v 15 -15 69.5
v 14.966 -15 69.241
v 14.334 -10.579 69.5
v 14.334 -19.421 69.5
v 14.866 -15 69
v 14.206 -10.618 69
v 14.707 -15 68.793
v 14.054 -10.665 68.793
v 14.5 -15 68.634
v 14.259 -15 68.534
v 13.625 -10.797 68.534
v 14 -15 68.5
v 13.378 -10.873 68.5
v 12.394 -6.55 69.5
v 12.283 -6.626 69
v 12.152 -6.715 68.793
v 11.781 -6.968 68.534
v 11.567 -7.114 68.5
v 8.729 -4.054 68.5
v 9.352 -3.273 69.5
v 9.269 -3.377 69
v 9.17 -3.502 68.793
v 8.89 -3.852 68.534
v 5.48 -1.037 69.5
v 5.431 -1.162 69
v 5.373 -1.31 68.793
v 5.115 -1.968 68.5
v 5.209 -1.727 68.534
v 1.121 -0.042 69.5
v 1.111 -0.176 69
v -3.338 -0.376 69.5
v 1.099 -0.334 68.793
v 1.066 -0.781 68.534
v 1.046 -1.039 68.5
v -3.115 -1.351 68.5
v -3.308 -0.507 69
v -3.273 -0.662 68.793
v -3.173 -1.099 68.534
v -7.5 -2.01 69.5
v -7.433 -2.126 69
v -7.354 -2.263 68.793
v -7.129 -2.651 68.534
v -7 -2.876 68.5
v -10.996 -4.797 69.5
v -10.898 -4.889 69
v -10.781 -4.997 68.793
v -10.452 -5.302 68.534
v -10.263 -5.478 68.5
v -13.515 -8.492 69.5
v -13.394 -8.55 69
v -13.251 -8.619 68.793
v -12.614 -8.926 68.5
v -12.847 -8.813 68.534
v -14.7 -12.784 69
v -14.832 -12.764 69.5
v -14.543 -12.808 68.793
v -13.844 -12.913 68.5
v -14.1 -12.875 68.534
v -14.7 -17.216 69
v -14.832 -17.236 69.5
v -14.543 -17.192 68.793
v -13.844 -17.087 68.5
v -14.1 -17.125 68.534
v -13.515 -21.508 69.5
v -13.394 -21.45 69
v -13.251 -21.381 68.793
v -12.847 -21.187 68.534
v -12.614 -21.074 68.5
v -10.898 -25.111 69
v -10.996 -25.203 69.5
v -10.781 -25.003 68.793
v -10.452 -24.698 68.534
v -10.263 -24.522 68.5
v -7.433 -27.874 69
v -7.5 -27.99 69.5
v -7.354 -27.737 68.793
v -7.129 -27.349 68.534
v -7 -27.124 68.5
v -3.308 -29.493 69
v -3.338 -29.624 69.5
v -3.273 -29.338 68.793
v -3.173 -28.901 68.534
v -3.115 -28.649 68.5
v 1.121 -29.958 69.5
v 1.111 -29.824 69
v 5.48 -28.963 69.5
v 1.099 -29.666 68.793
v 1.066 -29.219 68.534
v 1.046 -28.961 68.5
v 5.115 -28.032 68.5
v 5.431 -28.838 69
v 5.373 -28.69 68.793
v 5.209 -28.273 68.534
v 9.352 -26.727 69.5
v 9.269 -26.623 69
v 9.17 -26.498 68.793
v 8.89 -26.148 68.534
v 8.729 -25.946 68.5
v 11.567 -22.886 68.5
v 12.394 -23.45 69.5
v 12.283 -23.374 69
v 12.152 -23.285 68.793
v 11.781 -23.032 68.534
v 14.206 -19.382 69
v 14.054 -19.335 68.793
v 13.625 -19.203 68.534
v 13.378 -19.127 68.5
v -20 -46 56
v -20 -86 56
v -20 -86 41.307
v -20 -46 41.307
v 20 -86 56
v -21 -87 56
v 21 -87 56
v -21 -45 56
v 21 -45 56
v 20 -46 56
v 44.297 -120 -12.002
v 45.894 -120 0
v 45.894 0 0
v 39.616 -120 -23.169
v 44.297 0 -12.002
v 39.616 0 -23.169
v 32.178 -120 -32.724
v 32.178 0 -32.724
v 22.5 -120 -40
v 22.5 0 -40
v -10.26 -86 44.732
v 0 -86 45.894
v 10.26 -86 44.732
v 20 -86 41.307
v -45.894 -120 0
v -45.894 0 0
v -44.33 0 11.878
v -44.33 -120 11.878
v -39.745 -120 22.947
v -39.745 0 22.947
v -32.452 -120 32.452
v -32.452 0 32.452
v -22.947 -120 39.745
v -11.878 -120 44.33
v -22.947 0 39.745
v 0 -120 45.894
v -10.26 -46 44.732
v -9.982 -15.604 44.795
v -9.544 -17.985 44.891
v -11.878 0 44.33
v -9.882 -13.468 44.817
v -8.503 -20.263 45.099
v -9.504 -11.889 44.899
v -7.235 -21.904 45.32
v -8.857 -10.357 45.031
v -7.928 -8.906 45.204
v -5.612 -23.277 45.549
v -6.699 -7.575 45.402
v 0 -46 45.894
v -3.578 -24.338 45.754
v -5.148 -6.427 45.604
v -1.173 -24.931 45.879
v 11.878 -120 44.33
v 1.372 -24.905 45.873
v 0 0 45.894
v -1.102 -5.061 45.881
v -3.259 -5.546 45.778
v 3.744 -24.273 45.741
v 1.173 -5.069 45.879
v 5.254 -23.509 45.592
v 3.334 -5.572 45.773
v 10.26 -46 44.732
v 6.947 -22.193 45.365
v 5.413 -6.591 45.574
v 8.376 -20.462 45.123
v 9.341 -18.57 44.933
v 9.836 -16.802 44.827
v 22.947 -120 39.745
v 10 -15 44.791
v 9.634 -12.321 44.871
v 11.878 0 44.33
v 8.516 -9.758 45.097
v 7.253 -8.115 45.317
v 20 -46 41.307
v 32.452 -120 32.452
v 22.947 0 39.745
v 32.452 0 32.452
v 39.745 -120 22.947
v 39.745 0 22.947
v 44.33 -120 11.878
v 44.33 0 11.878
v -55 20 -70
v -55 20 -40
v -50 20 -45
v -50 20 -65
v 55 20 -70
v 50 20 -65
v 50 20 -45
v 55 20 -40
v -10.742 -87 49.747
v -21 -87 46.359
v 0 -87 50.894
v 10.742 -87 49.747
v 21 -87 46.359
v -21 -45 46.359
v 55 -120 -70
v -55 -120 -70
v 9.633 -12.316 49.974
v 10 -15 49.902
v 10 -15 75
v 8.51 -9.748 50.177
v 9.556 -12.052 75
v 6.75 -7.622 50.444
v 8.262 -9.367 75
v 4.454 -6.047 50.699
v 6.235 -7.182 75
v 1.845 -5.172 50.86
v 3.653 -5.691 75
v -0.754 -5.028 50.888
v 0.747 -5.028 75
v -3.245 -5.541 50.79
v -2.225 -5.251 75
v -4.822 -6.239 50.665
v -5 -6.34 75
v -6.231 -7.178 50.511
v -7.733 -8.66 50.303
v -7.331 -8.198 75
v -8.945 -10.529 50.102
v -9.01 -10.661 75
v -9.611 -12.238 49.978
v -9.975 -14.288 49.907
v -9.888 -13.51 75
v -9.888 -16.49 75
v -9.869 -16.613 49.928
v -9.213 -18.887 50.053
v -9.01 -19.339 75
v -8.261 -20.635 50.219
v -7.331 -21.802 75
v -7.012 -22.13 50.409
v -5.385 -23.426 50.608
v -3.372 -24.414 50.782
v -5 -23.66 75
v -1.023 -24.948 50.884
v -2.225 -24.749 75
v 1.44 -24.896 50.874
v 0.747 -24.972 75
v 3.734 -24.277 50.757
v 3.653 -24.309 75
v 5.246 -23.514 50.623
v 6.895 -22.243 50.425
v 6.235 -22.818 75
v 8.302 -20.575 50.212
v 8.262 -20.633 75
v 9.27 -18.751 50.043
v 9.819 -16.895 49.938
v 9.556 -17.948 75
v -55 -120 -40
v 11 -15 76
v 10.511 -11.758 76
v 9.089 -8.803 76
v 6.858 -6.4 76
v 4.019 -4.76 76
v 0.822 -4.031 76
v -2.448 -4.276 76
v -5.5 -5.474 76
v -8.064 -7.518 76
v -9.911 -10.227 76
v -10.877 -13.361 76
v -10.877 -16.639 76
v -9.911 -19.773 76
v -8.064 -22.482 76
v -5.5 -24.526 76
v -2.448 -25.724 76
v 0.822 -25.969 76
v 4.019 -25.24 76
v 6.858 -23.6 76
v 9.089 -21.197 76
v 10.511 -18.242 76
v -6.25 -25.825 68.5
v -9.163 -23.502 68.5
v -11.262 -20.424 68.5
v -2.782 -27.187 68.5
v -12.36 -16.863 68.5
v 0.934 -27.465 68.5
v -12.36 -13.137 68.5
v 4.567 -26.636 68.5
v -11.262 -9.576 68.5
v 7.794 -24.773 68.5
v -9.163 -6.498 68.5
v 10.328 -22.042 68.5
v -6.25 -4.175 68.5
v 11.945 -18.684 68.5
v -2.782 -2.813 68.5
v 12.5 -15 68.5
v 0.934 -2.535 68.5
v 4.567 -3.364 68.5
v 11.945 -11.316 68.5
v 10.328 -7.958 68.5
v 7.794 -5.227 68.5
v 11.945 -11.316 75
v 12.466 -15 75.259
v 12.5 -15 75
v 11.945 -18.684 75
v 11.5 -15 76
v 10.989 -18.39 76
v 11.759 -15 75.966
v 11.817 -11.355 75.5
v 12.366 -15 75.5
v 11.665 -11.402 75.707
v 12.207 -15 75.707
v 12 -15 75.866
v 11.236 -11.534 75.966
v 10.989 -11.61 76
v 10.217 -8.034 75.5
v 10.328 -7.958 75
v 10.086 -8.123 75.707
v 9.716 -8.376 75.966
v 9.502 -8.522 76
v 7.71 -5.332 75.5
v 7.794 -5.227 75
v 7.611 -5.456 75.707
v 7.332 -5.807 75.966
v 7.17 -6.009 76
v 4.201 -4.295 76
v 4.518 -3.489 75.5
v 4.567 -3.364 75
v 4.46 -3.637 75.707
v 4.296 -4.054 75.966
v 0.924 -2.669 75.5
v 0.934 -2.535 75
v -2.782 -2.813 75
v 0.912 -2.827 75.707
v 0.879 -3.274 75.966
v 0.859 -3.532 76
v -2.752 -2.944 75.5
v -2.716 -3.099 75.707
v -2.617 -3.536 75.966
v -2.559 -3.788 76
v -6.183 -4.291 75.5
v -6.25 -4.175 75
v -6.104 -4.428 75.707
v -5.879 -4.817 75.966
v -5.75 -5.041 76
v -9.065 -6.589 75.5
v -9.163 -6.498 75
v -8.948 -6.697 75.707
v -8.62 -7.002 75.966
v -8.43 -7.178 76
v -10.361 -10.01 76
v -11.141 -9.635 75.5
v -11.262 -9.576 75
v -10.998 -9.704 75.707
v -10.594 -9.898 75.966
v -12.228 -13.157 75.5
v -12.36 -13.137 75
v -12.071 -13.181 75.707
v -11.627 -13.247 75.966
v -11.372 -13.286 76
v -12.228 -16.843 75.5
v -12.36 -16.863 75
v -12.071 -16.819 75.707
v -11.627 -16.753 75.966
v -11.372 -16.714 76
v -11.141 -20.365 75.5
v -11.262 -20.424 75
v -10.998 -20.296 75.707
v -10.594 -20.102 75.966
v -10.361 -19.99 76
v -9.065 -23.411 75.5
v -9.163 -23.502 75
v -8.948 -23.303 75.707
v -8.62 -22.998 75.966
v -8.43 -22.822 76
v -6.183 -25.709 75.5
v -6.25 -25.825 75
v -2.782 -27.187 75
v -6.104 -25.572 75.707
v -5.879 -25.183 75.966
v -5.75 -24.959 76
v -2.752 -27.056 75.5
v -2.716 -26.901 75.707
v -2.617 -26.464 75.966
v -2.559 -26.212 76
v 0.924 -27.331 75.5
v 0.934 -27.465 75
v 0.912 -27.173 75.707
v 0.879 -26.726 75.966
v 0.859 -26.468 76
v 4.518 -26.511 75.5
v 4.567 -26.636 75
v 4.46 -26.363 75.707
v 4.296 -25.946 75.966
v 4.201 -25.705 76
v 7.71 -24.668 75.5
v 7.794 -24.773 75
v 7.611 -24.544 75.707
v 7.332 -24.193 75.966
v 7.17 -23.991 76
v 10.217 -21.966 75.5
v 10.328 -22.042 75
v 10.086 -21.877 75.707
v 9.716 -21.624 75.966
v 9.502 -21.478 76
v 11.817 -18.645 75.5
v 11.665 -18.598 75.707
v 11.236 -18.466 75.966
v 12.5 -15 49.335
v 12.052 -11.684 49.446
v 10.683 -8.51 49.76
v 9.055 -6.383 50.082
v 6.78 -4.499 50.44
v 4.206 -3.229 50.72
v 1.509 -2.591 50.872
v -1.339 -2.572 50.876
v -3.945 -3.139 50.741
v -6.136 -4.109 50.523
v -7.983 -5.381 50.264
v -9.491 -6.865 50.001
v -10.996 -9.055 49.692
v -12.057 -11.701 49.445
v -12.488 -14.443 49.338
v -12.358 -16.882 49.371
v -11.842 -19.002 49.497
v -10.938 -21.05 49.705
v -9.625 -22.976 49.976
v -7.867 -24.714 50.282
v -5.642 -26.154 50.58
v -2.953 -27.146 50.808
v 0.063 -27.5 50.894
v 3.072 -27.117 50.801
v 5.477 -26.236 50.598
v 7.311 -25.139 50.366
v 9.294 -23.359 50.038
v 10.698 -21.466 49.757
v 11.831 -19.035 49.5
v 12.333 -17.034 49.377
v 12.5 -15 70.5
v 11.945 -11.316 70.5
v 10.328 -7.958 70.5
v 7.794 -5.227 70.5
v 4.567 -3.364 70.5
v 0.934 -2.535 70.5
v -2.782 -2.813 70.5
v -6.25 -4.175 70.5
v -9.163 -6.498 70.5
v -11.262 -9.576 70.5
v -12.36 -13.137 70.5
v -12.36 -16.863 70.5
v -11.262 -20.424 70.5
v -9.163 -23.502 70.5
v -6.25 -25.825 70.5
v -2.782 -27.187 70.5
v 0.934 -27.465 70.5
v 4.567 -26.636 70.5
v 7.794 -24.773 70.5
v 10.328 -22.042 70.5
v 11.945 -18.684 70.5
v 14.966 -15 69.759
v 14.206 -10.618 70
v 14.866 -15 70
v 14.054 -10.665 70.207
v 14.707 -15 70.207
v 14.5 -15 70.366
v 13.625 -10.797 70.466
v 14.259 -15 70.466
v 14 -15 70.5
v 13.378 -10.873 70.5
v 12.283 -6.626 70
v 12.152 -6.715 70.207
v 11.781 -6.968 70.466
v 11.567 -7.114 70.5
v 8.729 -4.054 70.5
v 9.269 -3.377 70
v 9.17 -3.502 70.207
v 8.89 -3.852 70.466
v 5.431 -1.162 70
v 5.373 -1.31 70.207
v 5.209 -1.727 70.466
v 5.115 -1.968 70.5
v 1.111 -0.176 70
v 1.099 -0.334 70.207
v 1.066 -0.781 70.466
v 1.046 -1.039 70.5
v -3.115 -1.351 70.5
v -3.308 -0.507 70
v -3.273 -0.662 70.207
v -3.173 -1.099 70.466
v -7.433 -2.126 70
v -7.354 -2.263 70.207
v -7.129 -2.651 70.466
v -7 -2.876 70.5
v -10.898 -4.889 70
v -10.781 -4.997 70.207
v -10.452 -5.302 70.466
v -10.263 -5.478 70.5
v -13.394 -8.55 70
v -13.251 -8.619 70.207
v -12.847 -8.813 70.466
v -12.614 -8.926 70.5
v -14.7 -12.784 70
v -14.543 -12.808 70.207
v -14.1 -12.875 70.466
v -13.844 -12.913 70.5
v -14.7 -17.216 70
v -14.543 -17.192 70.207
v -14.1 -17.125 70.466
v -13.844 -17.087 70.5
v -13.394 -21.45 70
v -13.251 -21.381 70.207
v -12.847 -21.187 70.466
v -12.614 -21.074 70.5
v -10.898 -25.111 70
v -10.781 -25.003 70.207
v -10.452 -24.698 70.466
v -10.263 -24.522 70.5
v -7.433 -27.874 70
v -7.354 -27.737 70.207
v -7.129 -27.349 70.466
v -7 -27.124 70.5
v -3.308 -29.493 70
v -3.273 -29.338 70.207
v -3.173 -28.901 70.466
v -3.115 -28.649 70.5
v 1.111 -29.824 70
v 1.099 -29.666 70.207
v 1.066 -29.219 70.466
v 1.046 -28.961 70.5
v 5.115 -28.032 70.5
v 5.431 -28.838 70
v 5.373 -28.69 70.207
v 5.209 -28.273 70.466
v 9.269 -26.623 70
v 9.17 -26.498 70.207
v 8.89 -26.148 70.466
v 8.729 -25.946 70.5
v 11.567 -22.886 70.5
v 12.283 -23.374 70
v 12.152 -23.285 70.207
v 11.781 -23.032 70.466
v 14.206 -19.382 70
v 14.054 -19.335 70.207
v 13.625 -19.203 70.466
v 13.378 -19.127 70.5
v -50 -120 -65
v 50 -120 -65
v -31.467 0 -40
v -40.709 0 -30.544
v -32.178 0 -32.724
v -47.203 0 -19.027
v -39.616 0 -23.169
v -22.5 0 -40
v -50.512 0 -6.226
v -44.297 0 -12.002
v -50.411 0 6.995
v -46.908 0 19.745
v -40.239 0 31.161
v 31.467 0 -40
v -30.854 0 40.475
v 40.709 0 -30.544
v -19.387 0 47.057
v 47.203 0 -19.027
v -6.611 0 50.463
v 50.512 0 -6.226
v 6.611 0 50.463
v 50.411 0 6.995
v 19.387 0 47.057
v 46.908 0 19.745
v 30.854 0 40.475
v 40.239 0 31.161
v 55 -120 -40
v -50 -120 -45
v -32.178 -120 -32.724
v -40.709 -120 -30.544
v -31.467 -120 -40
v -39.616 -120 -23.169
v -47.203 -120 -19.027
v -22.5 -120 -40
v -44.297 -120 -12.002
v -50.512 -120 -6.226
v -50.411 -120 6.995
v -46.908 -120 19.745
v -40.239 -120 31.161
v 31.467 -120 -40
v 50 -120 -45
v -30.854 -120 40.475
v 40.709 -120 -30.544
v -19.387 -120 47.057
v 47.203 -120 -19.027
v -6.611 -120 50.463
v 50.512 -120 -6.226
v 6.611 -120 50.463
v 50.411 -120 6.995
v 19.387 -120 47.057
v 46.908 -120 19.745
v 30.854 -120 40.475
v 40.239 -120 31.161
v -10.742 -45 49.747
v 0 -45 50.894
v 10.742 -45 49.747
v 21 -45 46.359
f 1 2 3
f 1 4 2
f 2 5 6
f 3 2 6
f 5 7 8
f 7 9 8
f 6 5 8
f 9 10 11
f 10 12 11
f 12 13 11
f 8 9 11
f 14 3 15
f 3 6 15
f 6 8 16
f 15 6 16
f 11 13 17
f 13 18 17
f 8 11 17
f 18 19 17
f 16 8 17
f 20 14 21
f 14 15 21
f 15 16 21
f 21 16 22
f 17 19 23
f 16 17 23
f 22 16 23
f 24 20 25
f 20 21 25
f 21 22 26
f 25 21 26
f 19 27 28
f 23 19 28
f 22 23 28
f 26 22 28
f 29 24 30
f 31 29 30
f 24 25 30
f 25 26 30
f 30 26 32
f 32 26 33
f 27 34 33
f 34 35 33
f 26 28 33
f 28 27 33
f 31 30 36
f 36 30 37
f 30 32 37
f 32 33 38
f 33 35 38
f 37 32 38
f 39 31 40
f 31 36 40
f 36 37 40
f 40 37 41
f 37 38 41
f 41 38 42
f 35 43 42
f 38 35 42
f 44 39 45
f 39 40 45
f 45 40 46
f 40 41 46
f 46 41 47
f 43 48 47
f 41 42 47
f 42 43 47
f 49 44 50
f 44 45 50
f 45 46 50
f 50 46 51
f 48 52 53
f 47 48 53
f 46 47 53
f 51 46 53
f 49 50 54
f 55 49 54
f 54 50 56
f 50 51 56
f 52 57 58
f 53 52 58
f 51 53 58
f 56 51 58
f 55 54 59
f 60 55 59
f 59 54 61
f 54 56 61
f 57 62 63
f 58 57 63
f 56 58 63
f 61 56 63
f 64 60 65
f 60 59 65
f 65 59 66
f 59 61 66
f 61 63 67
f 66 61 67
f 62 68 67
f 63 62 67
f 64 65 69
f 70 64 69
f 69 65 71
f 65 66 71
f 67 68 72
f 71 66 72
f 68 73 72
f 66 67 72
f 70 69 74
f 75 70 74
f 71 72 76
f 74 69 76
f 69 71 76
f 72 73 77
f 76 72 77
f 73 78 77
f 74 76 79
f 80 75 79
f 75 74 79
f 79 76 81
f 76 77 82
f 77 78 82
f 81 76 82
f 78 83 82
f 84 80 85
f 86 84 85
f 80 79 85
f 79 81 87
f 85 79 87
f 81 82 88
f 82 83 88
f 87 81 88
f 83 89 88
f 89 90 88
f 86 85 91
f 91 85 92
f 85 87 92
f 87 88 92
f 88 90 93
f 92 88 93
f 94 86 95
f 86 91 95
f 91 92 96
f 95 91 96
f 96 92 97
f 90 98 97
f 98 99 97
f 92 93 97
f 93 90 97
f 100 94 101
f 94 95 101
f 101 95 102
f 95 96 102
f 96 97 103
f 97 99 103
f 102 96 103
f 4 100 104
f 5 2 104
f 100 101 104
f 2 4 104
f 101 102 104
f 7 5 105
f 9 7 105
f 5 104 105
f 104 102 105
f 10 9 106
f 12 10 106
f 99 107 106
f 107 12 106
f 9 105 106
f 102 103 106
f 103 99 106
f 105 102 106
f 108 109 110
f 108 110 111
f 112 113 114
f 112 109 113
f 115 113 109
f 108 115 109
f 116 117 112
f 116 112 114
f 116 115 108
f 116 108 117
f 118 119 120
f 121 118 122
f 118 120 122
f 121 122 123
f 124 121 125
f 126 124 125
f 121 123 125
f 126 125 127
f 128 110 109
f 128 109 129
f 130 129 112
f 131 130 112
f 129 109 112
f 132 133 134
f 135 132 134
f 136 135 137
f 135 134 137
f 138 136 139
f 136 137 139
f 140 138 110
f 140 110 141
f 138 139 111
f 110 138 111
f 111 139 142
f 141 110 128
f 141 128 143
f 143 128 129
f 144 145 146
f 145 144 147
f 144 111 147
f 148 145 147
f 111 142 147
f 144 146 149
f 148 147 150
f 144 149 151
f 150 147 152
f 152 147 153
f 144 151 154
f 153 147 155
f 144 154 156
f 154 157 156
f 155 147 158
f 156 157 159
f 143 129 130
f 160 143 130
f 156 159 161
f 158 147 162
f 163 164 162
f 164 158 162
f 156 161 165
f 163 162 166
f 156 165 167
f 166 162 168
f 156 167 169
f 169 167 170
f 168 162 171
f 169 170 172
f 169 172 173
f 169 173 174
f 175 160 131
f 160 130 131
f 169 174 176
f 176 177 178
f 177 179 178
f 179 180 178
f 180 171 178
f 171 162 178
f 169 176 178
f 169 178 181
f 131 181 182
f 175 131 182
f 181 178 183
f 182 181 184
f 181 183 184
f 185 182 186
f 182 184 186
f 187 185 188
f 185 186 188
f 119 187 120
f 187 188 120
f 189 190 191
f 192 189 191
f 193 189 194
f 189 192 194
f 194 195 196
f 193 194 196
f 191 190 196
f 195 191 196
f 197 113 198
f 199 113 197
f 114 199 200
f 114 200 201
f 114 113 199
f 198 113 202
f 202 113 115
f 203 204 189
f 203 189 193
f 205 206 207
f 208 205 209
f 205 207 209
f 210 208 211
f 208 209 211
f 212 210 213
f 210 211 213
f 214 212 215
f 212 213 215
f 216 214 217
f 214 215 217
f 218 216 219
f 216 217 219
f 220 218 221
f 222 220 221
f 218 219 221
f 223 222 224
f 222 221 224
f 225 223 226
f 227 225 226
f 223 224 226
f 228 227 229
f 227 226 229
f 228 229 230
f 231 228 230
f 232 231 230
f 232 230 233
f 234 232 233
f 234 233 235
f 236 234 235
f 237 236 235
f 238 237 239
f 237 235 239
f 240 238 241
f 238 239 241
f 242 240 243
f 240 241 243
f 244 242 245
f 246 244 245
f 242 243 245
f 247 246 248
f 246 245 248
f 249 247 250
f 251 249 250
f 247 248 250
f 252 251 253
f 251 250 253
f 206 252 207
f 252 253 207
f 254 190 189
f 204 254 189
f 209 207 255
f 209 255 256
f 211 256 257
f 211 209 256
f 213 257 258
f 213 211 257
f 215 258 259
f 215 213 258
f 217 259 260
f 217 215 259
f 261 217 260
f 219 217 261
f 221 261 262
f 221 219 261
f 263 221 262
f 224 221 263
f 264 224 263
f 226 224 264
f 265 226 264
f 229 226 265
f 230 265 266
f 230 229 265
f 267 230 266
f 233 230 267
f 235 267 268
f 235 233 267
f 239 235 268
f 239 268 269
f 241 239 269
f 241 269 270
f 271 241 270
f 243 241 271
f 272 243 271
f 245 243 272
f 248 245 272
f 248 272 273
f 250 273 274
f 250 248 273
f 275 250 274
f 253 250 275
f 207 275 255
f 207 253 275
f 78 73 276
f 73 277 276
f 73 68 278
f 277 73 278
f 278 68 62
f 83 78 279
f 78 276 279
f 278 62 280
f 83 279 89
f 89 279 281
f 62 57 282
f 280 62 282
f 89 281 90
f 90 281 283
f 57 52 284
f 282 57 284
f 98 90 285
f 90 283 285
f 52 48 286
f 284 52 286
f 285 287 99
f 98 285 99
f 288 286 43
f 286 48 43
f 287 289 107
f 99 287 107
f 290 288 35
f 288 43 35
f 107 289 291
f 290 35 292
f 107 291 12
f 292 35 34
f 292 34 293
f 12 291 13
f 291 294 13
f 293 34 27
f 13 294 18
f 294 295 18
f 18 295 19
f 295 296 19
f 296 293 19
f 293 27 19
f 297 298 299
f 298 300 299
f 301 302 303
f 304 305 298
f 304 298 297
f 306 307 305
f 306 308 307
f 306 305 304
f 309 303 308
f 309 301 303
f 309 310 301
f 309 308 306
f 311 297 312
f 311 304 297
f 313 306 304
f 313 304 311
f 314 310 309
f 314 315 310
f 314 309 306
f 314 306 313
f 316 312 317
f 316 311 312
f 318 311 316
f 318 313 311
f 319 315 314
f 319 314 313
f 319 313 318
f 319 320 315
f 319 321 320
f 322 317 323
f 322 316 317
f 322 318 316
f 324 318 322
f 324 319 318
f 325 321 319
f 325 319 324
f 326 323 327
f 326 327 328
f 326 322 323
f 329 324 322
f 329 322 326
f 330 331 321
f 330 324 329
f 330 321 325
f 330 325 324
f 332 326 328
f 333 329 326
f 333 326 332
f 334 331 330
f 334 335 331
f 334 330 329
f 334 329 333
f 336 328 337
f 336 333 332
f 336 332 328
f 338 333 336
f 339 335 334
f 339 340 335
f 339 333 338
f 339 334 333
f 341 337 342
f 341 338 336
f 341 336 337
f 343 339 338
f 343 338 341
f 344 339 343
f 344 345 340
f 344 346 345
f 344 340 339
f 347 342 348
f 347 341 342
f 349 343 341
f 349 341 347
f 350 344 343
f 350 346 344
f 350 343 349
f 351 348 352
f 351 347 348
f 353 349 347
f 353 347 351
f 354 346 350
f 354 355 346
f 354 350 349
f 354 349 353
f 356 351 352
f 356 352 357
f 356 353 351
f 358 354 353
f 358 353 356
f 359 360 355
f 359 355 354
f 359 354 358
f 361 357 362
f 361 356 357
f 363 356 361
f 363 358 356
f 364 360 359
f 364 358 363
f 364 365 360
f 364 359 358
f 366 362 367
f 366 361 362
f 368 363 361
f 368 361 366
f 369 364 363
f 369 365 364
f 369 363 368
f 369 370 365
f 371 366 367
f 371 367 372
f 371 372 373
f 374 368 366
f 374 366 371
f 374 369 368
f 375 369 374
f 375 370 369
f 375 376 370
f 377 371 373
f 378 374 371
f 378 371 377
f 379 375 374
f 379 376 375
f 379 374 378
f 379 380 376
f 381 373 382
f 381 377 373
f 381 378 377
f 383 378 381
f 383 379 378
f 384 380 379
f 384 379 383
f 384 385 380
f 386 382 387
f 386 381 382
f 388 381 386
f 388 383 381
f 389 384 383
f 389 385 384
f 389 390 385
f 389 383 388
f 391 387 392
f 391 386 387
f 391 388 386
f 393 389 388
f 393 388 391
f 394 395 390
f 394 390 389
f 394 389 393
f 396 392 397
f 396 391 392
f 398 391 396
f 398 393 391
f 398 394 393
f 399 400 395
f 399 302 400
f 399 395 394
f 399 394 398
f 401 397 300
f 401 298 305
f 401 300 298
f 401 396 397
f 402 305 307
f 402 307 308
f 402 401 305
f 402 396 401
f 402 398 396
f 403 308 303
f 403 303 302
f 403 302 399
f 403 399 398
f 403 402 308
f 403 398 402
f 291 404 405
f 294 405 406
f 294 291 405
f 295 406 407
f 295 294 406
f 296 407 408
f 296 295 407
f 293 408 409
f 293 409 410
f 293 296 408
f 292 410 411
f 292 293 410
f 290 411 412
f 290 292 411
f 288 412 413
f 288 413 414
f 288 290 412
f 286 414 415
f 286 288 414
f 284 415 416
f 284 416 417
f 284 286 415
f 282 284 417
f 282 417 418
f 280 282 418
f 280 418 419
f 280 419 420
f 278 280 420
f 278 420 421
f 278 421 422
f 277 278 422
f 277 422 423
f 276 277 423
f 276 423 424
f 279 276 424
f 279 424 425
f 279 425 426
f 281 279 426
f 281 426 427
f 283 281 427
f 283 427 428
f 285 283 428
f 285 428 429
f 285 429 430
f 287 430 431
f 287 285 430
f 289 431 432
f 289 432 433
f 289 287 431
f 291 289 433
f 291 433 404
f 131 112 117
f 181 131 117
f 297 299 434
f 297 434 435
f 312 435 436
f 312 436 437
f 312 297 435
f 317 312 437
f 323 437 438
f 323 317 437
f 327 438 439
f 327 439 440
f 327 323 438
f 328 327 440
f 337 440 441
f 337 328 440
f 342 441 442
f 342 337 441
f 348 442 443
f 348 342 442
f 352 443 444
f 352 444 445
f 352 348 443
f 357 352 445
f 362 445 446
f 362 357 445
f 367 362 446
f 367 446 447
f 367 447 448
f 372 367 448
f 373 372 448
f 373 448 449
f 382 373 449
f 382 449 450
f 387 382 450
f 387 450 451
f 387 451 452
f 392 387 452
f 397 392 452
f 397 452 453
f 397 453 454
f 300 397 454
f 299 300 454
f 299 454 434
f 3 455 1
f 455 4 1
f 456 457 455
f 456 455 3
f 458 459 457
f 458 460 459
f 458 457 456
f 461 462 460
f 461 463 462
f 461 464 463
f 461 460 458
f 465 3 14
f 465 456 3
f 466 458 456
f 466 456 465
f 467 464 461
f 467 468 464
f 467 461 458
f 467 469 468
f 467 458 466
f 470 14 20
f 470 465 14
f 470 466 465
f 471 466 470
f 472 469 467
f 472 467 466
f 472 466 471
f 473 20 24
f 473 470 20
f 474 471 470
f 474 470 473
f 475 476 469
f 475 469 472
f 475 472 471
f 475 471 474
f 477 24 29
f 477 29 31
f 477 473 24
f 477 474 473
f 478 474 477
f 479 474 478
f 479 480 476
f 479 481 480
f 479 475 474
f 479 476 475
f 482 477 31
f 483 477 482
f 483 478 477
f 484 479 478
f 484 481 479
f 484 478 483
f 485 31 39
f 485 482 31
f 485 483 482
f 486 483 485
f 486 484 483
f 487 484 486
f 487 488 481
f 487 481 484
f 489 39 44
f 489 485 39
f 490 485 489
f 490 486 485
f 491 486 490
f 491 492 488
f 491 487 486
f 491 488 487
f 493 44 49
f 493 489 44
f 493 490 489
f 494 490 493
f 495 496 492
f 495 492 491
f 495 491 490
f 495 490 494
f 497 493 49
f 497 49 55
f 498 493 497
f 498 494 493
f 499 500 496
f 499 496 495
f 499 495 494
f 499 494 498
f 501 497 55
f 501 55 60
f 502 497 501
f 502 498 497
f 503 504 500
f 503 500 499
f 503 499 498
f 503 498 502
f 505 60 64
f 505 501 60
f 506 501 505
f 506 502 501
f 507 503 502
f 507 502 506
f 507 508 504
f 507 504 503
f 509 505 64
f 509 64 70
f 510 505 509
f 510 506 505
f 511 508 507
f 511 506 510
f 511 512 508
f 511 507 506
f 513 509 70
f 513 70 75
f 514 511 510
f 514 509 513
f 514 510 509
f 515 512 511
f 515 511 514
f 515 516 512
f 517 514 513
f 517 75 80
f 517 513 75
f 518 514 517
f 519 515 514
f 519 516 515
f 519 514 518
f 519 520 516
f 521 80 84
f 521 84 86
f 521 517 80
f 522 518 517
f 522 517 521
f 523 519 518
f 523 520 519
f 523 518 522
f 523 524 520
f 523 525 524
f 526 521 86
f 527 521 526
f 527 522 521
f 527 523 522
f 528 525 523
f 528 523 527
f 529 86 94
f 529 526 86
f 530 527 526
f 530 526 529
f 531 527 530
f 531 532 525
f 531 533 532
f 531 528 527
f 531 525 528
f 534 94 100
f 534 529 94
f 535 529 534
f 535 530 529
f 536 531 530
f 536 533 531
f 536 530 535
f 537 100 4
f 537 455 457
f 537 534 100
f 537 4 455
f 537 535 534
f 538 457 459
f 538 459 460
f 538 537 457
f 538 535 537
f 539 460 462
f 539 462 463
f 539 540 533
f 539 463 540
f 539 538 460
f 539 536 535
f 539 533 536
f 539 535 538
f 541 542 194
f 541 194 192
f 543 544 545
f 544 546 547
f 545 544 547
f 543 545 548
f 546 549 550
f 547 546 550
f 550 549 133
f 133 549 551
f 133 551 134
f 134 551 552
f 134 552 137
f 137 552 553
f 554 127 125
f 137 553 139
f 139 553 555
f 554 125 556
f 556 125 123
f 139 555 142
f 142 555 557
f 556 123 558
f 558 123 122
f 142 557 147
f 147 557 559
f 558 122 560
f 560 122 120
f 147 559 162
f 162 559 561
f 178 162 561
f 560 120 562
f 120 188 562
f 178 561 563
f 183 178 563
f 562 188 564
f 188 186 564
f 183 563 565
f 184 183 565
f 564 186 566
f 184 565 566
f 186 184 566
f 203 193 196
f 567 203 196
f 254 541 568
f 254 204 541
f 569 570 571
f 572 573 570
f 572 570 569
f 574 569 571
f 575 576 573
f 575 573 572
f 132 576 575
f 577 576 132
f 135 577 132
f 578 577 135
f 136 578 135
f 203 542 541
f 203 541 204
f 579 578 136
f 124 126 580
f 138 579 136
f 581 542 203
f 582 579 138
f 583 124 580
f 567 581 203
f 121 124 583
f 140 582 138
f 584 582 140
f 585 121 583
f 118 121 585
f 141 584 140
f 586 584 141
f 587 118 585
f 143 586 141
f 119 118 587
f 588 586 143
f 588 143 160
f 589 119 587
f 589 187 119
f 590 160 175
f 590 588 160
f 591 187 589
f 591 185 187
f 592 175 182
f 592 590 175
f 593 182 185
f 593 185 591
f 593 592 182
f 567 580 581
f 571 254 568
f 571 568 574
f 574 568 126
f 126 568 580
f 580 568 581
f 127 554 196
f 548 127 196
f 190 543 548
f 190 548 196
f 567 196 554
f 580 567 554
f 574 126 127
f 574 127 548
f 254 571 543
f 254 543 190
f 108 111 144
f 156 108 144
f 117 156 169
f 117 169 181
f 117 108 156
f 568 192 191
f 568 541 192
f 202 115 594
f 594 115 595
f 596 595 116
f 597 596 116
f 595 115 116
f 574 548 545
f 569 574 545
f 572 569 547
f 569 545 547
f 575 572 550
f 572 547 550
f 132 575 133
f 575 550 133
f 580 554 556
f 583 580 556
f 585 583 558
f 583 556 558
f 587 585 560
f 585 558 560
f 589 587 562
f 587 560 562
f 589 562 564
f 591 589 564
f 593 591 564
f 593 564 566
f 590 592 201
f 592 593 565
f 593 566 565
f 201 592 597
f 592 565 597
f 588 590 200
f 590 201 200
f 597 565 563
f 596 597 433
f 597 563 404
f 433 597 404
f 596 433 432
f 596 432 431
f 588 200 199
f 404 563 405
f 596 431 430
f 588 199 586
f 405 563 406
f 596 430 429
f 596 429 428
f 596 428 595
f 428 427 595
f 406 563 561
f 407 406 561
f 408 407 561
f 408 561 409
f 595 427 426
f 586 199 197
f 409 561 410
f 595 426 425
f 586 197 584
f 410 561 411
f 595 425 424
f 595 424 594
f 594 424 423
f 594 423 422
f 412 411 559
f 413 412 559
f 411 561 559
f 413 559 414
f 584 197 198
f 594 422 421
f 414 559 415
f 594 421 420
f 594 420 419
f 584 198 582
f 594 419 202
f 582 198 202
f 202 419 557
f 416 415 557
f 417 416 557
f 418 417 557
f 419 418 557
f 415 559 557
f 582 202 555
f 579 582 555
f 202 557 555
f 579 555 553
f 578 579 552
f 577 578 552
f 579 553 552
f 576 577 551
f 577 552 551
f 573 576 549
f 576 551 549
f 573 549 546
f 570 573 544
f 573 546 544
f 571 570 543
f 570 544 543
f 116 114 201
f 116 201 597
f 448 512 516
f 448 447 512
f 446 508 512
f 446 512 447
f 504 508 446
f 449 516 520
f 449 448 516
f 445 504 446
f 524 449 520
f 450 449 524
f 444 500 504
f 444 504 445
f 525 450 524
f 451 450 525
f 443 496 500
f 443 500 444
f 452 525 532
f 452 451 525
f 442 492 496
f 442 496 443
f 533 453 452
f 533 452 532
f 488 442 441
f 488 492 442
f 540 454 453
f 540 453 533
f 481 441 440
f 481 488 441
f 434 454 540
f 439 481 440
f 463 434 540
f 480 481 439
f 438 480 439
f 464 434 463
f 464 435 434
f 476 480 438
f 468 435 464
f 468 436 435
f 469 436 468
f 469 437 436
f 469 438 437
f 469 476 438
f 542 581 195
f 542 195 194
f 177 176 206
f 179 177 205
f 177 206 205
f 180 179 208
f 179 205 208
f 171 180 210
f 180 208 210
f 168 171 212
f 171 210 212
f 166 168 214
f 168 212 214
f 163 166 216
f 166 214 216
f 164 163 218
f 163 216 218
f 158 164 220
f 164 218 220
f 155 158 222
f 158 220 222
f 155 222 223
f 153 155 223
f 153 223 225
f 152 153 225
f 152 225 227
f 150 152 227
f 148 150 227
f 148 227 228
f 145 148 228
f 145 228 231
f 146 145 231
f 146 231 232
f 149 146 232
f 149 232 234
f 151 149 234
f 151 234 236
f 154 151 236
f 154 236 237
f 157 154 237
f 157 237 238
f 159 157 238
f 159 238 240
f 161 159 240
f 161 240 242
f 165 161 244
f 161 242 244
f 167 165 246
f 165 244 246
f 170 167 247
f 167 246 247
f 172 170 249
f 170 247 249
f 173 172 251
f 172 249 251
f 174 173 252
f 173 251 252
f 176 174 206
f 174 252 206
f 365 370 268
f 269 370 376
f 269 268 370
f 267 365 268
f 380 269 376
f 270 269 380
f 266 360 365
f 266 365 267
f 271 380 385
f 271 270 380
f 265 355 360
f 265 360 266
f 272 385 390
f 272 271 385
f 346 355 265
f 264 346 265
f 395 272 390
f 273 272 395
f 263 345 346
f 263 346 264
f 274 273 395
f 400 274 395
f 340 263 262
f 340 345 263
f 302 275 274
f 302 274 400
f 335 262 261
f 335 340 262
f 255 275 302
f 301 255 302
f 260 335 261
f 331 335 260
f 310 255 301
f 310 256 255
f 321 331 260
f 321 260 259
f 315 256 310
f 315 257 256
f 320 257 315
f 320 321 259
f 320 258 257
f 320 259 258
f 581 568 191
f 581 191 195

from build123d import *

# Parameters (mm, degrees)
F1_DEPTH      = 120
F0_W          = 5
F0_H          = 5
F2_DEPTH      = 120
F2_DEPTH_BACK = 20
F6_R          = 12.5
F6_R_2        = 10
F7_DEPTH      = 30
F8_R          = 10
F9_DEPTH      = 25
F8_W          = 42
F8_H          = 42
F8_W_2        = 40
F8_H_2        = 40
F10_DEPTH     = 10
F11_DEPTH     = 25
F12_W         = 40
F12_H         = 30
F12_R         = 2.4384
F13_DEPTH     = 25
F16_R         = 15
F16_R_2       = 10
F17_DEPTH     = 2
F18_R         = 0.99999
F19_SIZE      = 1


# Not quite as in the source:
# - a fillet or chamfer is up to 0.001 mm smaller than in the source, because OpenCascade refuses the exact size
# - a feature of the source that left no trace in its solid (it failed there, or was rolled back) is left out
# - a feature names something its author has since deleted; it is built from what else it names


with BuildPart() as f1:
    # F0 (on Front) → F1 (new body)
    with BuildSketch(Plane.XZ):
        with BuildLine():
            ThreePointArc((-22.5, -40), (-39.6160493738, -23.1693468188), (-45.8938993767, 0))
            Line((-45.8938993767, 0), (-50.8938993767, 0))
            ThreePointArc((-50.8938993767, 0), (-45.7803505669, -22.233949171), (-31.4672686099, -40))
            Line((-31.4672686099, -40), (-22.5, -40))
        make_face()
        with BuildLine():
            Line((50.8938993767, 0), (45.8938993767, 0))
            ThreePointArc((45.8938993767, 0), (39.6160493738, -23.1693468188), (22.5, -40))
            Line((22.5, -40), (31.4672686099, -40))
            ThreePointArc((31.4672686099, -40), (45.7803505669, -22.233949171), (50.8938993767, 0))
        make_face()
        with BuildLine():
            ThreePointArc((-45.8938993767, 0), (0, 45.8938993767), (45.8938993767, 0))
            Line((45.8938993767, 0), (50.8938993767, 0))
            ThreePointArc((50.8938993767, 0), (0, 50.8938993767), (-50.8938993767, 0))
            Line((-50.8938993767, 0), (-45.8938993767, 0))
        make_face()
    extrude(amount=F1_DEPTH)

    # F0 (on Front) → F2 (join, two sides)
    with BuildSketch(Plane.XZ) as f2_sk:
        with BuildLine():
            Line((31.4672686099, -40), (22.5, -40))
            ThreePointArc((22.5, -40), (15.954031767, -43.0316031583), (9.0138781887, -45))
            Line((9.0138781887, -45), (23.7737038294, -45))
            ThreePointArc((23.7737038294, -45), (27.7333960958, -42.6737358894), (31.4672686099, -40))
        make_face()
        with BuildLine():
            ThreePointArc((9.0138781887, -45), (15.954031767, -43.0316031583), (22.5, -40))
            Line((22.5, -40), (0, -40))
            Line((0, -40), (-22.5, -40))
            ThreePointArc((-22.5, -40), (-15.954031767, -43.0316031583), (-9.0138781887, -45))
            Line((-9.0138781887, -45), (9.0138781887, -45))
        make_face()
        with BuildLine():
            ThreePointArc((-9.0138781887, -45), (-15.954031767, -43.0316031583), (-22.5, -40))
            Line((-22.5, -40), (-31.4672686099, -40))
            ThreePointArc((-31.4672686099, -40), (-27.7333960958, -42.6737358894), (-23.7737038294, -45))
            Line((-23.7737038294, -45), (-9.0138781887, -45))
        make_face()
        with BuildLine():
            ThreePointArc((-23.7737038294, -45), (-27.7333960958, -42.6737358894), (-31.4672686099, -40))
            Line((-31.4672686099, -40), (-55, -40))
            Line((-55, -40), (-55, -65))
            Line((-55, -65), (-50, -65))
            Line((-50, -65), (-50, -45))
            Line((-50, -45), (-23.7737038294, -45))
        make_face()
        with Locations((-52.5, -67.5)):
            Rectangle(F0_W, F0_H)
        with BuildLine():
            Line((55, -40), (31.4672686099, -40))
            ThreePointArc((31.4672686099, -40), (27.7333960958, -42.6737358894), (23.7737038294, -45))
            Line((23.7737038294, -45), (50, -45))
            Line((50, -45), (50, -65))
            Line((50, -65), (-50, -65))
            Line((-50, -65), (-50, -70))
            Line((-50, -70), (55, -70))
            Line((55, -70), (55, -40))
        make_face()
    extrude(amount=F2_DEPTH)
    extrude(f2_sk.sketch, amount=-F2_DEPTH_BACK)

    # F6 (on offset) → F7 (join)
    with BuildSketch(Plane.XY.offset(76)):
        with Locations((0, -15)):
            Circle(F6_R)
        with Locations((0, -15)):
            Circle(F6_R_2, mode=Mode.SUBTRACT)
    extrude(amount=-F7_DEPTH)

    # F8 (on offset) → F9 (cut)
    with BuildSketch(Plane.XY.offset(56)):
        with Locations((0, -15)):
            Circle(F8_R)
    extrude(amount=-F9_DEPTH, mode=Mode.SUBTRACT)

    # F8 (on offset) → F10 (join)
    with BuildSketch(Plane.XY.offset(56)):
        with Locations((0, -66)):
            Rectangle(F8_W, F8_H)
        with Locations((0, -66)):
            Rectangle(F8_W_2, F8_H_2, mode=Mode.SUBTRACT)
    extrude(amount=-F10_DEPTH)

    # F8 (on offset) → F11 (cut)
    with BuildSketch(Plane.XY.offset(56)):
        with Locations((0, -66)):
            Rectangle(F8_W_2, F8_H_2)
    extrude(amount=-F11_DEPTH, mode=Mode.SUBTRACT)

    # F12 (on face) → F13 (cut)
    with BuildSketch(Plane.XY.offset(-40)):
        with Locations((3.8294e-06, 35)):
            Rectangle(F12_W, F12_H)
        with Locations((0, 60)):
            Circle(F12_R)
    extrude(amount=-F13_DEPTH, mode=Mode.SUBTRACT)

    # F16 (on offset) → F17 (join)
    with BuildSketch(Plane.XY.offset(68.5)):
        with Locations((0, -15)):
            Circle(F16_R)
        with Locations((0, -15)):
            Circle(F16_R_2, mode=Mode.SUBTRACT)
    extrude(amount=F17_DEPTH)

    # F18 (radius 1 in the source; OpenCascade refuses exactly that, so slightly less here)
    f18_edges = [f1.edges().sort_by_distance(p)[0] for p in [
        (-15, -15, 70.5),
        (-15, -15, 68.5),
        (-12.5, -15, 76),
    ]]
    fillet(f18_edges, radius=F18_R)

    # F19
    f19_edges = [f1.edges().sort_by_distance(p)[0] for p in [
        (-10, -15, 76),
    ]]
    chamfer(f19_edges, length=F19_SIZE)


solid = f1.part
